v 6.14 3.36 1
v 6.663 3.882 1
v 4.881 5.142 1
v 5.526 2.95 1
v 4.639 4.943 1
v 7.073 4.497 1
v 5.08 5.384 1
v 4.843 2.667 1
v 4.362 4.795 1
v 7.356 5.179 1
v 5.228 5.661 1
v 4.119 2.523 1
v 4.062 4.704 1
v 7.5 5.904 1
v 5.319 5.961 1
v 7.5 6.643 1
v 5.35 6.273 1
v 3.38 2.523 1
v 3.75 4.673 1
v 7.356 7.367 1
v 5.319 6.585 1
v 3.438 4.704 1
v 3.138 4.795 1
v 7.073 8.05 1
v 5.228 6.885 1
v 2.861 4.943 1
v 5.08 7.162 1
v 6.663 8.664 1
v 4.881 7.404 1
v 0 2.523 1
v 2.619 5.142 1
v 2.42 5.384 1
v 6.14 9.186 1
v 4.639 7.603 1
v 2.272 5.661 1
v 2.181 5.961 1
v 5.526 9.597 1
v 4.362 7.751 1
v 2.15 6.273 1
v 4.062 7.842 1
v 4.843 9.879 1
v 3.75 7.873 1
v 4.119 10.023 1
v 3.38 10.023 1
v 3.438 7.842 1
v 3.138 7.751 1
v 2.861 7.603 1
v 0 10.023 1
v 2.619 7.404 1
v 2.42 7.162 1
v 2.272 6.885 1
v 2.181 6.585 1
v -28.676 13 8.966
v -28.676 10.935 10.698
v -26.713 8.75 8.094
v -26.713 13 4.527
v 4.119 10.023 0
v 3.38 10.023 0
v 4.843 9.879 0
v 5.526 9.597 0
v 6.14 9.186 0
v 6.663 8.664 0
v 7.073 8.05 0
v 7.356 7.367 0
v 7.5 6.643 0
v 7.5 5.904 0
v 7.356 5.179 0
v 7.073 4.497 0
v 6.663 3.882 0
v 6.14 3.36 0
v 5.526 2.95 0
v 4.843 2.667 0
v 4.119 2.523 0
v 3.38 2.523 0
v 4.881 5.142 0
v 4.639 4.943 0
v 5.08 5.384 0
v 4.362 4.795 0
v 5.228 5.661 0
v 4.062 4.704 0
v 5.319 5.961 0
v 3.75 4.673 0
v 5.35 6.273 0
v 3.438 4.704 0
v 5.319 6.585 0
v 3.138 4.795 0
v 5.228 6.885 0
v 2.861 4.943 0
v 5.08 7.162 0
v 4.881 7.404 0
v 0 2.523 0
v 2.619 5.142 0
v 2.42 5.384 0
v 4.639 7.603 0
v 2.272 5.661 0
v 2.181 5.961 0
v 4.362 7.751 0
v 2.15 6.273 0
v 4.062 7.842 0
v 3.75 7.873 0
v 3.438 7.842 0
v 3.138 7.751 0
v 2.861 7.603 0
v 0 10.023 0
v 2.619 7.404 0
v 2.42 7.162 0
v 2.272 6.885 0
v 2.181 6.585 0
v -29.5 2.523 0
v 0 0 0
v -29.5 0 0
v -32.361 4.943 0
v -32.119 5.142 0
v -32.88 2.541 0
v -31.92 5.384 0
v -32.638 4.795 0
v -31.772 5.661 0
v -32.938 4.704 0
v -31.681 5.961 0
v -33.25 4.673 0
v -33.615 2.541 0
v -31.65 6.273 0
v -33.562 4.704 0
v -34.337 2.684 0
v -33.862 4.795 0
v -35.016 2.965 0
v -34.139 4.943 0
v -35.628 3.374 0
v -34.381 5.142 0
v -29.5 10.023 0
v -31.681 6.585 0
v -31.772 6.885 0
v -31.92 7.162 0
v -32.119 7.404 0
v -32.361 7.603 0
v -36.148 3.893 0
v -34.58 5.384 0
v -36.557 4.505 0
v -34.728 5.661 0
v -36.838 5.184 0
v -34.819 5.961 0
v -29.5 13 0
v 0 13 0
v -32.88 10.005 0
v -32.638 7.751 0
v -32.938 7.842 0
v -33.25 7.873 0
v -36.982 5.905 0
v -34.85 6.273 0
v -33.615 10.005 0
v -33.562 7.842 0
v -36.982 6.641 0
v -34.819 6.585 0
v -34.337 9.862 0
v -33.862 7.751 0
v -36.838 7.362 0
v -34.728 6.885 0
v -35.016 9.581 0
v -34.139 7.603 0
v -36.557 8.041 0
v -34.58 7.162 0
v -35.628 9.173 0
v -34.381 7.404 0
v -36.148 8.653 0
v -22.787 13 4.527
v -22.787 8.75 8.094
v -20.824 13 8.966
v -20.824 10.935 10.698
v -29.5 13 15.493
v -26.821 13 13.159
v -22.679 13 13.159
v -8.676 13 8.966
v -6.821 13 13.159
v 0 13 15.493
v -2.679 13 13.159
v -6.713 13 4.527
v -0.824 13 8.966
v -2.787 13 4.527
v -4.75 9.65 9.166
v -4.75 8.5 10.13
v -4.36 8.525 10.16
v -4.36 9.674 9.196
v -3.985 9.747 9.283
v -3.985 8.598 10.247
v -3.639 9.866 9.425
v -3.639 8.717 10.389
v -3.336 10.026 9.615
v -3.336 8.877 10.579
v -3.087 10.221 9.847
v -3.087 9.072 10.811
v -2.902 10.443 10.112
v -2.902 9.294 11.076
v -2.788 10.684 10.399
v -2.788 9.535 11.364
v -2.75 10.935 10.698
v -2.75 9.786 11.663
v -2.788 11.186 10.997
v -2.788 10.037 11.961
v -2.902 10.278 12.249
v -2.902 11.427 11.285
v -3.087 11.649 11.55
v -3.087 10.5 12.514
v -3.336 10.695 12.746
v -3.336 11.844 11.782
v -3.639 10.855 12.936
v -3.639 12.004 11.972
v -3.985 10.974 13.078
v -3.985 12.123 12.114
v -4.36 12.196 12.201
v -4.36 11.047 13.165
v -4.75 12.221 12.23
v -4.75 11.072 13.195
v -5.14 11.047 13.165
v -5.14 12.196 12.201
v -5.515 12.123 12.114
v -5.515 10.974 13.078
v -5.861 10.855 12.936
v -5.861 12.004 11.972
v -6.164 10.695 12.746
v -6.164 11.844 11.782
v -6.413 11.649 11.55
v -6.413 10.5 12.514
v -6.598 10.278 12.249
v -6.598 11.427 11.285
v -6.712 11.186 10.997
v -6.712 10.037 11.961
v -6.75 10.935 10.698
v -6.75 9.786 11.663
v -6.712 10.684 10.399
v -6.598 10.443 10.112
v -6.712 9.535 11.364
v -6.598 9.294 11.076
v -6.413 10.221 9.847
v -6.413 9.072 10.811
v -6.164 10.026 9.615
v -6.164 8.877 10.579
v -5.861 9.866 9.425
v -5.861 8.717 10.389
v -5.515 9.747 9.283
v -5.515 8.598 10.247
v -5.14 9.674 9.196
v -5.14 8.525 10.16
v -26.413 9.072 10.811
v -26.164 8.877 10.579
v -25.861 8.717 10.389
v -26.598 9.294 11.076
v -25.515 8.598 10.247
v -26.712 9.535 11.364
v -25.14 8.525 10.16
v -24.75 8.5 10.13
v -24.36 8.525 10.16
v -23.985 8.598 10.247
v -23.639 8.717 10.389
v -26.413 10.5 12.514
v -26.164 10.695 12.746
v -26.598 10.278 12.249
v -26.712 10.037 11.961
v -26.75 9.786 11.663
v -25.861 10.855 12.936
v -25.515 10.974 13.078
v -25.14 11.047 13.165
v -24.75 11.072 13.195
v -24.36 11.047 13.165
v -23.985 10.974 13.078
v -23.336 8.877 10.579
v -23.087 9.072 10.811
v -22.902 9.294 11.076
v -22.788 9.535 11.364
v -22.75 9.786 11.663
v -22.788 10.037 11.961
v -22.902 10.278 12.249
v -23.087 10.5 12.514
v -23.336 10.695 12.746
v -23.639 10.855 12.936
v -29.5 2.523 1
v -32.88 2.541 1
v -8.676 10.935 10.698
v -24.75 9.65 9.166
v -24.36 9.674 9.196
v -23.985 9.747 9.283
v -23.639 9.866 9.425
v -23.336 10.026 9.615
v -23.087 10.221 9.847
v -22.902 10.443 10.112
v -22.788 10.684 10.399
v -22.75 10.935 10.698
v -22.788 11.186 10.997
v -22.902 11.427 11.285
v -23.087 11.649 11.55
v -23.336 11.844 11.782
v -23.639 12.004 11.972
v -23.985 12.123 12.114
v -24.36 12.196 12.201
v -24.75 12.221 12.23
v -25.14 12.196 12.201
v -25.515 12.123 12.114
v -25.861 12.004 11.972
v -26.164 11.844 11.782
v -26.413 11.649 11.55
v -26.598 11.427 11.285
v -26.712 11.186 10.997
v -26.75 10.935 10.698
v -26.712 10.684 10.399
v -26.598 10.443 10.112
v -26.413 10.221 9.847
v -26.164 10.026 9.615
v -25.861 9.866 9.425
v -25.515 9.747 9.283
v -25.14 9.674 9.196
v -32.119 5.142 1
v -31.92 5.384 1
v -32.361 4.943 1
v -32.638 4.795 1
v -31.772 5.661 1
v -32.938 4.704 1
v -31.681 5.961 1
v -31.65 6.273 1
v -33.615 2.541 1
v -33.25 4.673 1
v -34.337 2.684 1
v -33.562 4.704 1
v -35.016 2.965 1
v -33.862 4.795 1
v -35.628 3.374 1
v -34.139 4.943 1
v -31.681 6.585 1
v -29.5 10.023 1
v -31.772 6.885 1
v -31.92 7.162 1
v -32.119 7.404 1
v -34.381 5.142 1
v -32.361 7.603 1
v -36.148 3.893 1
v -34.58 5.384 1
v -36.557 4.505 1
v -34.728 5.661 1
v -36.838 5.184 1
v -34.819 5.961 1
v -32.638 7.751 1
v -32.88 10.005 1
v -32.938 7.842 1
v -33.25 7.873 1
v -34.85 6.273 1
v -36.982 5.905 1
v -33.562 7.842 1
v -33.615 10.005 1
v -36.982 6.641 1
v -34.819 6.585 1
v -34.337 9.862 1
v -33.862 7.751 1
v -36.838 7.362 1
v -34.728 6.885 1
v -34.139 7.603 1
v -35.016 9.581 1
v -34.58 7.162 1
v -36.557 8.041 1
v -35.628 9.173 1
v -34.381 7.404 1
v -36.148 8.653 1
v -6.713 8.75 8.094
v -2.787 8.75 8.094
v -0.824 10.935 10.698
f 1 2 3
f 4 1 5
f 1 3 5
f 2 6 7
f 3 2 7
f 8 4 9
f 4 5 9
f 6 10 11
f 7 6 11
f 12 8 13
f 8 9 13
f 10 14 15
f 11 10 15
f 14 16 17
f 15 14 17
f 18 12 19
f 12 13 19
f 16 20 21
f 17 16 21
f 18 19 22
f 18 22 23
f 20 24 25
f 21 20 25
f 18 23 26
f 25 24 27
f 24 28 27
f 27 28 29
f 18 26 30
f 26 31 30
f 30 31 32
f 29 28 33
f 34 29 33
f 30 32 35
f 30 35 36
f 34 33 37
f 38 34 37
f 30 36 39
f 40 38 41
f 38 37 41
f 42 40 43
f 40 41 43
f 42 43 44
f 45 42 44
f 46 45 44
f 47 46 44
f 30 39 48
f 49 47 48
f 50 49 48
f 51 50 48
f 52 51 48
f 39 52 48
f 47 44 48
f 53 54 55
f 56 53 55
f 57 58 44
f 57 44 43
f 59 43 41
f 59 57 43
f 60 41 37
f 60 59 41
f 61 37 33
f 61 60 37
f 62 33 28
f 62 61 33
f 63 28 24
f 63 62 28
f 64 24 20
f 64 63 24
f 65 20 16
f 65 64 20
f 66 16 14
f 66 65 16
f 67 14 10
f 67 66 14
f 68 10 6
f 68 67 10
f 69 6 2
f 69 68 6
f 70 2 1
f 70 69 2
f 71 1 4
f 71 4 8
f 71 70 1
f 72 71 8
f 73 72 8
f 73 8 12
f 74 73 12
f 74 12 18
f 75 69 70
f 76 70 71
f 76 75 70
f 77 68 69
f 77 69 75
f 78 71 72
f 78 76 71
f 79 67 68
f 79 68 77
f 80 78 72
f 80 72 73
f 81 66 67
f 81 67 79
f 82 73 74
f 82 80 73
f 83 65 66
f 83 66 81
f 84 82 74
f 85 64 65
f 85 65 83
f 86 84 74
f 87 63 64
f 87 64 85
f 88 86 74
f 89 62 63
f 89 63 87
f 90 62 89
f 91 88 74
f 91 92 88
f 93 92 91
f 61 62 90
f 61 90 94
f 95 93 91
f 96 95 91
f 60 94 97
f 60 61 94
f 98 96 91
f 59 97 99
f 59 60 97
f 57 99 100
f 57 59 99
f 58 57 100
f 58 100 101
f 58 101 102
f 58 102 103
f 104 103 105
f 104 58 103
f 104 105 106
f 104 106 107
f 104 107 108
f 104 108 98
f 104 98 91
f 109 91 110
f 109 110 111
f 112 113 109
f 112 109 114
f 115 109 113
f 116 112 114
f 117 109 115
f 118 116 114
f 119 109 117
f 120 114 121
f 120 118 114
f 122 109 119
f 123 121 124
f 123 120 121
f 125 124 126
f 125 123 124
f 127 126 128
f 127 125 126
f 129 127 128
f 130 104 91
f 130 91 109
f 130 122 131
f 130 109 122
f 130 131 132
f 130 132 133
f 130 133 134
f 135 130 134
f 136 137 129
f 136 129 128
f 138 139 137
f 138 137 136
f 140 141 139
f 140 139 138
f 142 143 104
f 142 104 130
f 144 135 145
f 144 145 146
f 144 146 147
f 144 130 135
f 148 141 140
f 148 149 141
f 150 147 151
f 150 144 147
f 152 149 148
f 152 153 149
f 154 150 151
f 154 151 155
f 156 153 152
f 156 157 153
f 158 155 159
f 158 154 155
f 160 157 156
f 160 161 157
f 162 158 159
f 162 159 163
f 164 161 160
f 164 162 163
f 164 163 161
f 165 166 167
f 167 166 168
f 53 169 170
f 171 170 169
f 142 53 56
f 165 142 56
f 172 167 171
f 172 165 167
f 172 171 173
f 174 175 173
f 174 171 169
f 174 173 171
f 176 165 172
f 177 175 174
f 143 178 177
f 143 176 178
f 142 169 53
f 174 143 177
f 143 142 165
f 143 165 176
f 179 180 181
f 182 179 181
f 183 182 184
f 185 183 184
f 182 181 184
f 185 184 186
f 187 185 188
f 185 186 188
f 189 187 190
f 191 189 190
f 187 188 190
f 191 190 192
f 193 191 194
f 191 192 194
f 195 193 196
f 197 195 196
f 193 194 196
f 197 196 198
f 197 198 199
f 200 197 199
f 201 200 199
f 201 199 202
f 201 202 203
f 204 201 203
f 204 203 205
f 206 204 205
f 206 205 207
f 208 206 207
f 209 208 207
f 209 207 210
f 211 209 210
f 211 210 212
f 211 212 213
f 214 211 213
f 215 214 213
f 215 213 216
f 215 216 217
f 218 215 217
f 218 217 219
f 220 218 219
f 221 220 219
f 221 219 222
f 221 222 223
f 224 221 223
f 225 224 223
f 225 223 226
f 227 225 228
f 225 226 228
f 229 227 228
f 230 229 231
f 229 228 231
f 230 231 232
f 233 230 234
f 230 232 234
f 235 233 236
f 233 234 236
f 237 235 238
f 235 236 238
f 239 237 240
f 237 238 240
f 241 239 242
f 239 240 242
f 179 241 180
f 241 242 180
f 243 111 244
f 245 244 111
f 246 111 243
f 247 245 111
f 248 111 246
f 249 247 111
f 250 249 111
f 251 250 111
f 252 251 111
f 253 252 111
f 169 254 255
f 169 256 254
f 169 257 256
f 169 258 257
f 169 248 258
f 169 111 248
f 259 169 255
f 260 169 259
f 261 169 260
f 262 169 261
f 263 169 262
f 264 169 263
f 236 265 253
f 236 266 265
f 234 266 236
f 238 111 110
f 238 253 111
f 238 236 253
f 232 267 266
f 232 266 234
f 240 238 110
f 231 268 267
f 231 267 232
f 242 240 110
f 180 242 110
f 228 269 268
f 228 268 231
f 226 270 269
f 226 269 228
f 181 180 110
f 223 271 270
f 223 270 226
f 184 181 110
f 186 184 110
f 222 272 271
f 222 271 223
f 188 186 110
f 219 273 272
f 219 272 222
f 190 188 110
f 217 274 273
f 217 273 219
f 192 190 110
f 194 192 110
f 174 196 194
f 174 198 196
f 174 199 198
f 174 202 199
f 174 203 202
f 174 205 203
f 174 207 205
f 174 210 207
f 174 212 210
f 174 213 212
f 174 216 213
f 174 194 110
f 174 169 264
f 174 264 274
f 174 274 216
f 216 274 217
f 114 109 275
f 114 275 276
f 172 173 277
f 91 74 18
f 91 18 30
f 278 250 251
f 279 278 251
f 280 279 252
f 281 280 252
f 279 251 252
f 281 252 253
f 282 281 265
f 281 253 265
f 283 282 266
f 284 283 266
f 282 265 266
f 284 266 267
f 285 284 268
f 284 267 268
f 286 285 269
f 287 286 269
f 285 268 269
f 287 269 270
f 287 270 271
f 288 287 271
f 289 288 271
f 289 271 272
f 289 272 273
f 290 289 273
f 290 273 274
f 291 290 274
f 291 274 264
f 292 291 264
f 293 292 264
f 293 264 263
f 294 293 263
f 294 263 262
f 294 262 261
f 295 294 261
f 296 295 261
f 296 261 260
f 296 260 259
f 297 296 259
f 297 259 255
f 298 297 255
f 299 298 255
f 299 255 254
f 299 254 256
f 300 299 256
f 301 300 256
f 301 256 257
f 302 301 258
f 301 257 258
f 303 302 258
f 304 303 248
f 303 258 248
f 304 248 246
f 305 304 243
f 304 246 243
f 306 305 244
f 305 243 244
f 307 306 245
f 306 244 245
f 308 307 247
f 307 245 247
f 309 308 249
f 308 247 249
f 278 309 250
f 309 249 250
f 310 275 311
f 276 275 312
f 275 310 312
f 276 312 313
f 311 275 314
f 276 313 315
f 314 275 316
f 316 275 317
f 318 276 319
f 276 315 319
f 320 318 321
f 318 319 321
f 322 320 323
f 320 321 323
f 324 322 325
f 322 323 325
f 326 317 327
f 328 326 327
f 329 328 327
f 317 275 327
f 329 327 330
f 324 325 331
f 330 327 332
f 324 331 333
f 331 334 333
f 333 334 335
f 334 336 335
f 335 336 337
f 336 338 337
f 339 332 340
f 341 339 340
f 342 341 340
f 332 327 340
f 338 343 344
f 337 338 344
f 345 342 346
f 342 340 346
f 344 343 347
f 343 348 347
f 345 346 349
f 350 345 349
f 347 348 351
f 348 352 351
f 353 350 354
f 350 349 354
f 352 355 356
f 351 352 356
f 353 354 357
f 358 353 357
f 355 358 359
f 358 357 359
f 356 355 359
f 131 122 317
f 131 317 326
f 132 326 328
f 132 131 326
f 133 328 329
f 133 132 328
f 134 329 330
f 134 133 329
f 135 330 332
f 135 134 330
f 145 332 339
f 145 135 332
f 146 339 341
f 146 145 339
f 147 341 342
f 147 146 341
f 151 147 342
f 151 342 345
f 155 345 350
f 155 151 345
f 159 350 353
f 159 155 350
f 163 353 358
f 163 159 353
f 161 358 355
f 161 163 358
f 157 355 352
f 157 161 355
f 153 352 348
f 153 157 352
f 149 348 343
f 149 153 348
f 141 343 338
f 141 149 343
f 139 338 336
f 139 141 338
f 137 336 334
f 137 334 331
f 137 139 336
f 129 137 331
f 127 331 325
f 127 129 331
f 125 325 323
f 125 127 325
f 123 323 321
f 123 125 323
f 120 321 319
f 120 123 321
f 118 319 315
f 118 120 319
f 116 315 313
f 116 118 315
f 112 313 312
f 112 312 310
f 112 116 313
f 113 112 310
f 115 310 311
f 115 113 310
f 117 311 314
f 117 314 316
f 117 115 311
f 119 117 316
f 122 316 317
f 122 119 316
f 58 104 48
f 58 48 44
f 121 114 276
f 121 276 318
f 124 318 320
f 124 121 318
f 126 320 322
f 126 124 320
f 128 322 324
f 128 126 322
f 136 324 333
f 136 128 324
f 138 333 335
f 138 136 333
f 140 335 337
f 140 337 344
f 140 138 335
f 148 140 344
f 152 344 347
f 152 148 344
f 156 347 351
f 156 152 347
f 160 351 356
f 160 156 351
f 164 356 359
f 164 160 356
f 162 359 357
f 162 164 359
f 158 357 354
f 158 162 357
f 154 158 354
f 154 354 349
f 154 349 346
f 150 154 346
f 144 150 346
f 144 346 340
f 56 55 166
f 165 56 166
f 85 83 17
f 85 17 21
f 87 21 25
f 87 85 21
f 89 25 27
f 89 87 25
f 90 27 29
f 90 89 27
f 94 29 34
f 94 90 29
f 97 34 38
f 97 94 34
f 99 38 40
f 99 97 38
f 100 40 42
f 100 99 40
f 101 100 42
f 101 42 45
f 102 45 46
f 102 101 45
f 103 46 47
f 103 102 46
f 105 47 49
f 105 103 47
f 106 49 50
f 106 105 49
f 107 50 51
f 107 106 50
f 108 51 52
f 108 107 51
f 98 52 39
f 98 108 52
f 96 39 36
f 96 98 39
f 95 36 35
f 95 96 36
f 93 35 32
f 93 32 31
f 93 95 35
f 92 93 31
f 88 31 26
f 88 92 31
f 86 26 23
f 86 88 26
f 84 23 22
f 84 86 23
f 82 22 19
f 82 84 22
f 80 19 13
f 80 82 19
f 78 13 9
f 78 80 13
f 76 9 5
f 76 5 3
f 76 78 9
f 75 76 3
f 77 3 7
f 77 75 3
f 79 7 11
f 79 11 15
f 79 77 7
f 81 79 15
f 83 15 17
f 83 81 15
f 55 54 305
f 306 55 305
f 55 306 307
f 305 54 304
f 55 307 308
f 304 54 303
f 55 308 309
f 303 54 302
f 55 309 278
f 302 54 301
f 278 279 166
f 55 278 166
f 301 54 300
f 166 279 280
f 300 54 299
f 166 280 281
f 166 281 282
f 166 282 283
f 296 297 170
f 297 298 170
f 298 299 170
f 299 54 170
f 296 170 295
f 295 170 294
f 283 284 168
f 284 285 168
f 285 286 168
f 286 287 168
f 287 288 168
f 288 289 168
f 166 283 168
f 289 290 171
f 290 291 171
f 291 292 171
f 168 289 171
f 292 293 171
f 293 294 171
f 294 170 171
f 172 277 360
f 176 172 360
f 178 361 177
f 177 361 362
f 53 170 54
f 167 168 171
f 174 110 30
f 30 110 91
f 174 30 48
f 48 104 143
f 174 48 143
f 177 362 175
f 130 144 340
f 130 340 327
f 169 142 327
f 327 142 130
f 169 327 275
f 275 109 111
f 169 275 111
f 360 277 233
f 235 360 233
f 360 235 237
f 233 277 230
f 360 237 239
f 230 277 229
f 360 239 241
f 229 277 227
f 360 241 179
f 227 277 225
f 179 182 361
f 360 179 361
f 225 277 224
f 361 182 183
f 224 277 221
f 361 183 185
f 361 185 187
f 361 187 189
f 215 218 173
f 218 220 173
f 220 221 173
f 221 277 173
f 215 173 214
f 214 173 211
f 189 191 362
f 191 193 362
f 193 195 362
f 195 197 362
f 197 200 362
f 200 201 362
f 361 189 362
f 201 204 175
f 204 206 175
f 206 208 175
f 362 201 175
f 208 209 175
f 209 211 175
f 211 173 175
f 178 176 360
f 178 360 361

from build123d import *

# Parameters (mm, degrees)
SKETCH1_R           = 1.6
BOSS_EXTRUDE1_DEPTH = 1
BOSS_EXTRUDE2_DEPTH = 15.492796704
SKETCH2_R           = 2
CUT_EXTRUDE2_DEPTH  = 43.166654476
CUT_EXTRUDE3_START  = -1.5
SKETCH2_3_R         = 2
CUT_EXTRUDE3_DEPTH  = 41.666654476
SKETCH3_W           = 29.5
SKETCH3_H           = 22.485495194
CUT_EXTRUDE4_DEPTH  = 43.166654476


with BuildPart() as part:
    # Sketch1 → Boss-Extrude1 (new body)
    # profile 1 of 3: a face of its own
    with BuildSketch(Plane.XY):
        Polygon((-29.5, 10.023123532), (-29.5, 13), (0, 13), (0, 10.023123532), (0, 2.523123532), (0, 0), (-29.5, 0), (-29.5, 2.523123532), align=None)
    # profile 2 of 3: a face of its own
    with BuildSketch(Plane.XY):
        with BuildLine():
            ThreePointArc((3.38, 10.023123532), (7.518209124, 6.273123532), (3.38, 2.523123532))
            Line((3.38, 2.523123532), (0, 2.523123532))
            Line((0, 2.523123532), (0, 10.023123532))
            Line((0, 10.023123532), (3.38, 10.023123532))
        make_face()
        with Locations((3.75, 6.273123532)):
            Circle(SKETCH1_R, mode=Mode.SUBTRACT)
    # profile 3 of 3: a face of its own
    with BuildSketch(Plane.XY):
        with BuildLine():
            ThreePointArc((-32.88, 2.541421507), (-37, 6.273123532), (-32.88, 10.004825556))
            Line((-32.88, 10.004825556), (-29.5, 10.023123532))
            Line((-29.5, 10.023123532), (-29.5, 2.523123532))
            Line((-29.5, 2.523123532), (-32.88, 2.541421507))
        make_face()
        with Locations((-33.25, 6.273123532)):
            Circle(SKETCH1_R, mode=Mode.SUBTRACT)
    extrude(amount=BOSS_EXTRUDE1_DEPTH)

    # Sketch1<4> → Boss-Extrude2 (add)
    with BuildSketch(Plane.XY):
        Polygon((-29.5, 10.023123532), (-29.5, 13), (0, 13), (0, 10.023123532), (0, 2.523123532), (0, 0), (-29.5, 0), (-29.5, 2.523123532), align=None)
    extrude(amount=BOSS_EXTRUDE2_DEPTH)

    # Sketch2 → Cut-Extrude2 (cut, through all)
    with BuildSketch(Plane(origin=(0, 0, 0), x_dir=(1, 0, 0), z_dir=(0, -0.7660444431189791, 0.642787609686538))):
        with Locations(Location((-4.75, 15.224409749, 0), (0, 0, 270))):
            Circle(SKETCH2_R)
        with Locations(Location((-24.75, 15.224409749, 0), (0, 0, 270))):
            Circle(SKETCH2_R)
    extrude(amount=-CUT_EXTRUDE2_DEPTH, mode=Mode.SUBTRACT)

    # Sketch2<3> → Cut-Extrude3 (cut, through all)
    # profile 1 of 2: a face of its own
    with BuildSketch(Plane(origin=(0, 0, 0), x_dir=(1, 0, 0), z_dir=(0, -0.7660444431189791, 0.642787609686538)).offset(CUT_EXTRUDE3_START)):
        Polygon((-2.787009085, 11.824409749), (-0.82401817, 15.224409749), (-2.787009085, 18.624409749), (-6.712990915, 18.624409749), (-8.67598183, 15.224409749), (-6.712990915, 11.824409749), align=None)
        with Locations(Location((-4.75, 15.224409749, 0), (0, 0, 270))):
            Circle(SKETCH2_3_R, mode=Mode.SUBTRACT)
    # profile 2 of 2: a face of its own
    with BuildSketch(Plane(origin=(0, 0, 0), x_dir=(1, 0, 0), z_dir=(0, -0.7660444431189791, 0.642787609686538)).offset(CUT_EXTRUDE3_START)):
        Polygon((-20.82401817, 15.224409749), (-22.787009085, 18.624409749), (-26.712990915, 18.624409749), (-28.67598183, 15.224409749), (-26.712990915, 11.824409749), (-22.787009085, 11.824409749), align=None)
        with Locations(Location((-24.75, 15.224409749, 0), (0, 0, 270))):
            Circle(SKETCH2_3_R, mode=Mode.SUBTRACT)
    extrude(amount=-CUT_EXTRUDE3_DEPTH, mode=Mode.SUBTRACT)

    # Sketch3 → Cut-Extrude4 (cut, through all)
    with BuildSketch(Plane(origin=(0, 0, 0), x_dir=(1, 0, 0), z_dir=(0, -0.7660444431189791, 0.642787609686538))):
        with Locations((-14.75, 8.981662152)):
            Rectangle(SKETCH3_W, SKETCH3_H)
    extrude(amount=CUT_EXTRUDE4_DEPTH, mode=Mode.SUBTRACT)


solid = part.part
